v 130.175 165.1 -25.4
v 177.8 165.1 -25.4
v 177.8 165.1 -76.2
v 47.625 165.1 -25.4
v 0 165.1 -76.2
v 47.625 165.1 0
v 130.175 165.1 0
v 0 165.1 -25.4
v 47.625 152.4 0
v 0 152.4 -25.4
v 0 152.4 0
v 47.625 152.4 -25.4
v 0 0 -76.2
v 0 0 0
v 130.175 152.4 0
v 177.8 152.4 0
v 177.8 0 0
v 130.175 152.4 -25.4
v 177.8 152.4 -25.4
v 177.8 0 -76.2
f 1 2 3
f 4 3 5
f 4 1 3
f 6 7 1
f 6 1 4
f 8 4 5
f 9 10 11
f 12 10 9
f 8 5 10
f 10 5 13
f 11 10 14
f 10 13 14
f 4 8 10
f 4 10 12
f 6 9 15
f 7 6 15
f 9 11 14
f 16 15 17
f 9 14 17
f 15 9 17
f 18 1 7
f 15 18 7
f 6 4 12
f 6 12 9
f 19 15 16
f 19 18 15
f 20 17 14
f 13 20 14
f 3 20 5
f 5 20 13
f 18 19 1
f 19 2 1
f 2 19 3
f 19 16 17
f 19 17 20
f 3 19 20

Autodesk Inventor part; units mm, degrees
ref_plane "YZ Plane" through (0, 0, 0) normal (1, 0, 0) x (0, 1, 0)
ref_plane "XZ Plane" through (0, 0, 0) normal (0, 1, 0) x (-1, 0, 0)
ref_plane "XY Plane" through (0, 0, 0) normal (0, 0, 1) x (1, 0, 0)
sketch "Sketch1" plane through (0, 0, 0) normal (0, 1, 0) x (-1, 0, 0)
  line L0 (0, 0) -> (-177.8, 0)
  line L1 (-177.8, 0) -> (-177.8, -76.2)
  line L2 (-177.8, -76.2) -> (0, -76.2)
  line L3 (0, -76.2) -> (0, 0)
  dimension "d0" = 177.8
  dimension "d1" = 76.2
extrude "Extrusion1" add sketch "Sketch1" along normal blind 165.1
sketch "Sketch2" plane through (0, 165.1, 0) normal (0, 1, 0) x (1, 0, 0)
  line L0 (177.8, 25.4) -> (130.175, 25.4)
  line L1 (130.175, 25.4) -> (130.175, 0)
  line L2 (0, 25.4) -> (47.625, 25.4)
  line L3 (47.625, 25.4) -> (47.625, 0)
  line L4 (0, 0) -> (177.8, 0) projected
  line L5 (0, 76.2) -> (0, 0) projected
  line L6 (177.8, 0) -> (177.8, 76.2) projected
  line L7 (0, 25.4) -> (0, 0)
  line L8 (0, 0) -> (47.625, 0)
  line L9 (130.175, 0) -> (177.8, 0)
  line L10 (177.8, 25.4) -> (177.8, 0)
  dimension "d4" = 47.625
  dimension "d5" = 47.625
  dimension "d6" = 25.4
  dimension "d7" = 25.4
extrude "Extrusion2" cut sketch "Sketch2" against normal blind 12.7
properties part number "Battery"
